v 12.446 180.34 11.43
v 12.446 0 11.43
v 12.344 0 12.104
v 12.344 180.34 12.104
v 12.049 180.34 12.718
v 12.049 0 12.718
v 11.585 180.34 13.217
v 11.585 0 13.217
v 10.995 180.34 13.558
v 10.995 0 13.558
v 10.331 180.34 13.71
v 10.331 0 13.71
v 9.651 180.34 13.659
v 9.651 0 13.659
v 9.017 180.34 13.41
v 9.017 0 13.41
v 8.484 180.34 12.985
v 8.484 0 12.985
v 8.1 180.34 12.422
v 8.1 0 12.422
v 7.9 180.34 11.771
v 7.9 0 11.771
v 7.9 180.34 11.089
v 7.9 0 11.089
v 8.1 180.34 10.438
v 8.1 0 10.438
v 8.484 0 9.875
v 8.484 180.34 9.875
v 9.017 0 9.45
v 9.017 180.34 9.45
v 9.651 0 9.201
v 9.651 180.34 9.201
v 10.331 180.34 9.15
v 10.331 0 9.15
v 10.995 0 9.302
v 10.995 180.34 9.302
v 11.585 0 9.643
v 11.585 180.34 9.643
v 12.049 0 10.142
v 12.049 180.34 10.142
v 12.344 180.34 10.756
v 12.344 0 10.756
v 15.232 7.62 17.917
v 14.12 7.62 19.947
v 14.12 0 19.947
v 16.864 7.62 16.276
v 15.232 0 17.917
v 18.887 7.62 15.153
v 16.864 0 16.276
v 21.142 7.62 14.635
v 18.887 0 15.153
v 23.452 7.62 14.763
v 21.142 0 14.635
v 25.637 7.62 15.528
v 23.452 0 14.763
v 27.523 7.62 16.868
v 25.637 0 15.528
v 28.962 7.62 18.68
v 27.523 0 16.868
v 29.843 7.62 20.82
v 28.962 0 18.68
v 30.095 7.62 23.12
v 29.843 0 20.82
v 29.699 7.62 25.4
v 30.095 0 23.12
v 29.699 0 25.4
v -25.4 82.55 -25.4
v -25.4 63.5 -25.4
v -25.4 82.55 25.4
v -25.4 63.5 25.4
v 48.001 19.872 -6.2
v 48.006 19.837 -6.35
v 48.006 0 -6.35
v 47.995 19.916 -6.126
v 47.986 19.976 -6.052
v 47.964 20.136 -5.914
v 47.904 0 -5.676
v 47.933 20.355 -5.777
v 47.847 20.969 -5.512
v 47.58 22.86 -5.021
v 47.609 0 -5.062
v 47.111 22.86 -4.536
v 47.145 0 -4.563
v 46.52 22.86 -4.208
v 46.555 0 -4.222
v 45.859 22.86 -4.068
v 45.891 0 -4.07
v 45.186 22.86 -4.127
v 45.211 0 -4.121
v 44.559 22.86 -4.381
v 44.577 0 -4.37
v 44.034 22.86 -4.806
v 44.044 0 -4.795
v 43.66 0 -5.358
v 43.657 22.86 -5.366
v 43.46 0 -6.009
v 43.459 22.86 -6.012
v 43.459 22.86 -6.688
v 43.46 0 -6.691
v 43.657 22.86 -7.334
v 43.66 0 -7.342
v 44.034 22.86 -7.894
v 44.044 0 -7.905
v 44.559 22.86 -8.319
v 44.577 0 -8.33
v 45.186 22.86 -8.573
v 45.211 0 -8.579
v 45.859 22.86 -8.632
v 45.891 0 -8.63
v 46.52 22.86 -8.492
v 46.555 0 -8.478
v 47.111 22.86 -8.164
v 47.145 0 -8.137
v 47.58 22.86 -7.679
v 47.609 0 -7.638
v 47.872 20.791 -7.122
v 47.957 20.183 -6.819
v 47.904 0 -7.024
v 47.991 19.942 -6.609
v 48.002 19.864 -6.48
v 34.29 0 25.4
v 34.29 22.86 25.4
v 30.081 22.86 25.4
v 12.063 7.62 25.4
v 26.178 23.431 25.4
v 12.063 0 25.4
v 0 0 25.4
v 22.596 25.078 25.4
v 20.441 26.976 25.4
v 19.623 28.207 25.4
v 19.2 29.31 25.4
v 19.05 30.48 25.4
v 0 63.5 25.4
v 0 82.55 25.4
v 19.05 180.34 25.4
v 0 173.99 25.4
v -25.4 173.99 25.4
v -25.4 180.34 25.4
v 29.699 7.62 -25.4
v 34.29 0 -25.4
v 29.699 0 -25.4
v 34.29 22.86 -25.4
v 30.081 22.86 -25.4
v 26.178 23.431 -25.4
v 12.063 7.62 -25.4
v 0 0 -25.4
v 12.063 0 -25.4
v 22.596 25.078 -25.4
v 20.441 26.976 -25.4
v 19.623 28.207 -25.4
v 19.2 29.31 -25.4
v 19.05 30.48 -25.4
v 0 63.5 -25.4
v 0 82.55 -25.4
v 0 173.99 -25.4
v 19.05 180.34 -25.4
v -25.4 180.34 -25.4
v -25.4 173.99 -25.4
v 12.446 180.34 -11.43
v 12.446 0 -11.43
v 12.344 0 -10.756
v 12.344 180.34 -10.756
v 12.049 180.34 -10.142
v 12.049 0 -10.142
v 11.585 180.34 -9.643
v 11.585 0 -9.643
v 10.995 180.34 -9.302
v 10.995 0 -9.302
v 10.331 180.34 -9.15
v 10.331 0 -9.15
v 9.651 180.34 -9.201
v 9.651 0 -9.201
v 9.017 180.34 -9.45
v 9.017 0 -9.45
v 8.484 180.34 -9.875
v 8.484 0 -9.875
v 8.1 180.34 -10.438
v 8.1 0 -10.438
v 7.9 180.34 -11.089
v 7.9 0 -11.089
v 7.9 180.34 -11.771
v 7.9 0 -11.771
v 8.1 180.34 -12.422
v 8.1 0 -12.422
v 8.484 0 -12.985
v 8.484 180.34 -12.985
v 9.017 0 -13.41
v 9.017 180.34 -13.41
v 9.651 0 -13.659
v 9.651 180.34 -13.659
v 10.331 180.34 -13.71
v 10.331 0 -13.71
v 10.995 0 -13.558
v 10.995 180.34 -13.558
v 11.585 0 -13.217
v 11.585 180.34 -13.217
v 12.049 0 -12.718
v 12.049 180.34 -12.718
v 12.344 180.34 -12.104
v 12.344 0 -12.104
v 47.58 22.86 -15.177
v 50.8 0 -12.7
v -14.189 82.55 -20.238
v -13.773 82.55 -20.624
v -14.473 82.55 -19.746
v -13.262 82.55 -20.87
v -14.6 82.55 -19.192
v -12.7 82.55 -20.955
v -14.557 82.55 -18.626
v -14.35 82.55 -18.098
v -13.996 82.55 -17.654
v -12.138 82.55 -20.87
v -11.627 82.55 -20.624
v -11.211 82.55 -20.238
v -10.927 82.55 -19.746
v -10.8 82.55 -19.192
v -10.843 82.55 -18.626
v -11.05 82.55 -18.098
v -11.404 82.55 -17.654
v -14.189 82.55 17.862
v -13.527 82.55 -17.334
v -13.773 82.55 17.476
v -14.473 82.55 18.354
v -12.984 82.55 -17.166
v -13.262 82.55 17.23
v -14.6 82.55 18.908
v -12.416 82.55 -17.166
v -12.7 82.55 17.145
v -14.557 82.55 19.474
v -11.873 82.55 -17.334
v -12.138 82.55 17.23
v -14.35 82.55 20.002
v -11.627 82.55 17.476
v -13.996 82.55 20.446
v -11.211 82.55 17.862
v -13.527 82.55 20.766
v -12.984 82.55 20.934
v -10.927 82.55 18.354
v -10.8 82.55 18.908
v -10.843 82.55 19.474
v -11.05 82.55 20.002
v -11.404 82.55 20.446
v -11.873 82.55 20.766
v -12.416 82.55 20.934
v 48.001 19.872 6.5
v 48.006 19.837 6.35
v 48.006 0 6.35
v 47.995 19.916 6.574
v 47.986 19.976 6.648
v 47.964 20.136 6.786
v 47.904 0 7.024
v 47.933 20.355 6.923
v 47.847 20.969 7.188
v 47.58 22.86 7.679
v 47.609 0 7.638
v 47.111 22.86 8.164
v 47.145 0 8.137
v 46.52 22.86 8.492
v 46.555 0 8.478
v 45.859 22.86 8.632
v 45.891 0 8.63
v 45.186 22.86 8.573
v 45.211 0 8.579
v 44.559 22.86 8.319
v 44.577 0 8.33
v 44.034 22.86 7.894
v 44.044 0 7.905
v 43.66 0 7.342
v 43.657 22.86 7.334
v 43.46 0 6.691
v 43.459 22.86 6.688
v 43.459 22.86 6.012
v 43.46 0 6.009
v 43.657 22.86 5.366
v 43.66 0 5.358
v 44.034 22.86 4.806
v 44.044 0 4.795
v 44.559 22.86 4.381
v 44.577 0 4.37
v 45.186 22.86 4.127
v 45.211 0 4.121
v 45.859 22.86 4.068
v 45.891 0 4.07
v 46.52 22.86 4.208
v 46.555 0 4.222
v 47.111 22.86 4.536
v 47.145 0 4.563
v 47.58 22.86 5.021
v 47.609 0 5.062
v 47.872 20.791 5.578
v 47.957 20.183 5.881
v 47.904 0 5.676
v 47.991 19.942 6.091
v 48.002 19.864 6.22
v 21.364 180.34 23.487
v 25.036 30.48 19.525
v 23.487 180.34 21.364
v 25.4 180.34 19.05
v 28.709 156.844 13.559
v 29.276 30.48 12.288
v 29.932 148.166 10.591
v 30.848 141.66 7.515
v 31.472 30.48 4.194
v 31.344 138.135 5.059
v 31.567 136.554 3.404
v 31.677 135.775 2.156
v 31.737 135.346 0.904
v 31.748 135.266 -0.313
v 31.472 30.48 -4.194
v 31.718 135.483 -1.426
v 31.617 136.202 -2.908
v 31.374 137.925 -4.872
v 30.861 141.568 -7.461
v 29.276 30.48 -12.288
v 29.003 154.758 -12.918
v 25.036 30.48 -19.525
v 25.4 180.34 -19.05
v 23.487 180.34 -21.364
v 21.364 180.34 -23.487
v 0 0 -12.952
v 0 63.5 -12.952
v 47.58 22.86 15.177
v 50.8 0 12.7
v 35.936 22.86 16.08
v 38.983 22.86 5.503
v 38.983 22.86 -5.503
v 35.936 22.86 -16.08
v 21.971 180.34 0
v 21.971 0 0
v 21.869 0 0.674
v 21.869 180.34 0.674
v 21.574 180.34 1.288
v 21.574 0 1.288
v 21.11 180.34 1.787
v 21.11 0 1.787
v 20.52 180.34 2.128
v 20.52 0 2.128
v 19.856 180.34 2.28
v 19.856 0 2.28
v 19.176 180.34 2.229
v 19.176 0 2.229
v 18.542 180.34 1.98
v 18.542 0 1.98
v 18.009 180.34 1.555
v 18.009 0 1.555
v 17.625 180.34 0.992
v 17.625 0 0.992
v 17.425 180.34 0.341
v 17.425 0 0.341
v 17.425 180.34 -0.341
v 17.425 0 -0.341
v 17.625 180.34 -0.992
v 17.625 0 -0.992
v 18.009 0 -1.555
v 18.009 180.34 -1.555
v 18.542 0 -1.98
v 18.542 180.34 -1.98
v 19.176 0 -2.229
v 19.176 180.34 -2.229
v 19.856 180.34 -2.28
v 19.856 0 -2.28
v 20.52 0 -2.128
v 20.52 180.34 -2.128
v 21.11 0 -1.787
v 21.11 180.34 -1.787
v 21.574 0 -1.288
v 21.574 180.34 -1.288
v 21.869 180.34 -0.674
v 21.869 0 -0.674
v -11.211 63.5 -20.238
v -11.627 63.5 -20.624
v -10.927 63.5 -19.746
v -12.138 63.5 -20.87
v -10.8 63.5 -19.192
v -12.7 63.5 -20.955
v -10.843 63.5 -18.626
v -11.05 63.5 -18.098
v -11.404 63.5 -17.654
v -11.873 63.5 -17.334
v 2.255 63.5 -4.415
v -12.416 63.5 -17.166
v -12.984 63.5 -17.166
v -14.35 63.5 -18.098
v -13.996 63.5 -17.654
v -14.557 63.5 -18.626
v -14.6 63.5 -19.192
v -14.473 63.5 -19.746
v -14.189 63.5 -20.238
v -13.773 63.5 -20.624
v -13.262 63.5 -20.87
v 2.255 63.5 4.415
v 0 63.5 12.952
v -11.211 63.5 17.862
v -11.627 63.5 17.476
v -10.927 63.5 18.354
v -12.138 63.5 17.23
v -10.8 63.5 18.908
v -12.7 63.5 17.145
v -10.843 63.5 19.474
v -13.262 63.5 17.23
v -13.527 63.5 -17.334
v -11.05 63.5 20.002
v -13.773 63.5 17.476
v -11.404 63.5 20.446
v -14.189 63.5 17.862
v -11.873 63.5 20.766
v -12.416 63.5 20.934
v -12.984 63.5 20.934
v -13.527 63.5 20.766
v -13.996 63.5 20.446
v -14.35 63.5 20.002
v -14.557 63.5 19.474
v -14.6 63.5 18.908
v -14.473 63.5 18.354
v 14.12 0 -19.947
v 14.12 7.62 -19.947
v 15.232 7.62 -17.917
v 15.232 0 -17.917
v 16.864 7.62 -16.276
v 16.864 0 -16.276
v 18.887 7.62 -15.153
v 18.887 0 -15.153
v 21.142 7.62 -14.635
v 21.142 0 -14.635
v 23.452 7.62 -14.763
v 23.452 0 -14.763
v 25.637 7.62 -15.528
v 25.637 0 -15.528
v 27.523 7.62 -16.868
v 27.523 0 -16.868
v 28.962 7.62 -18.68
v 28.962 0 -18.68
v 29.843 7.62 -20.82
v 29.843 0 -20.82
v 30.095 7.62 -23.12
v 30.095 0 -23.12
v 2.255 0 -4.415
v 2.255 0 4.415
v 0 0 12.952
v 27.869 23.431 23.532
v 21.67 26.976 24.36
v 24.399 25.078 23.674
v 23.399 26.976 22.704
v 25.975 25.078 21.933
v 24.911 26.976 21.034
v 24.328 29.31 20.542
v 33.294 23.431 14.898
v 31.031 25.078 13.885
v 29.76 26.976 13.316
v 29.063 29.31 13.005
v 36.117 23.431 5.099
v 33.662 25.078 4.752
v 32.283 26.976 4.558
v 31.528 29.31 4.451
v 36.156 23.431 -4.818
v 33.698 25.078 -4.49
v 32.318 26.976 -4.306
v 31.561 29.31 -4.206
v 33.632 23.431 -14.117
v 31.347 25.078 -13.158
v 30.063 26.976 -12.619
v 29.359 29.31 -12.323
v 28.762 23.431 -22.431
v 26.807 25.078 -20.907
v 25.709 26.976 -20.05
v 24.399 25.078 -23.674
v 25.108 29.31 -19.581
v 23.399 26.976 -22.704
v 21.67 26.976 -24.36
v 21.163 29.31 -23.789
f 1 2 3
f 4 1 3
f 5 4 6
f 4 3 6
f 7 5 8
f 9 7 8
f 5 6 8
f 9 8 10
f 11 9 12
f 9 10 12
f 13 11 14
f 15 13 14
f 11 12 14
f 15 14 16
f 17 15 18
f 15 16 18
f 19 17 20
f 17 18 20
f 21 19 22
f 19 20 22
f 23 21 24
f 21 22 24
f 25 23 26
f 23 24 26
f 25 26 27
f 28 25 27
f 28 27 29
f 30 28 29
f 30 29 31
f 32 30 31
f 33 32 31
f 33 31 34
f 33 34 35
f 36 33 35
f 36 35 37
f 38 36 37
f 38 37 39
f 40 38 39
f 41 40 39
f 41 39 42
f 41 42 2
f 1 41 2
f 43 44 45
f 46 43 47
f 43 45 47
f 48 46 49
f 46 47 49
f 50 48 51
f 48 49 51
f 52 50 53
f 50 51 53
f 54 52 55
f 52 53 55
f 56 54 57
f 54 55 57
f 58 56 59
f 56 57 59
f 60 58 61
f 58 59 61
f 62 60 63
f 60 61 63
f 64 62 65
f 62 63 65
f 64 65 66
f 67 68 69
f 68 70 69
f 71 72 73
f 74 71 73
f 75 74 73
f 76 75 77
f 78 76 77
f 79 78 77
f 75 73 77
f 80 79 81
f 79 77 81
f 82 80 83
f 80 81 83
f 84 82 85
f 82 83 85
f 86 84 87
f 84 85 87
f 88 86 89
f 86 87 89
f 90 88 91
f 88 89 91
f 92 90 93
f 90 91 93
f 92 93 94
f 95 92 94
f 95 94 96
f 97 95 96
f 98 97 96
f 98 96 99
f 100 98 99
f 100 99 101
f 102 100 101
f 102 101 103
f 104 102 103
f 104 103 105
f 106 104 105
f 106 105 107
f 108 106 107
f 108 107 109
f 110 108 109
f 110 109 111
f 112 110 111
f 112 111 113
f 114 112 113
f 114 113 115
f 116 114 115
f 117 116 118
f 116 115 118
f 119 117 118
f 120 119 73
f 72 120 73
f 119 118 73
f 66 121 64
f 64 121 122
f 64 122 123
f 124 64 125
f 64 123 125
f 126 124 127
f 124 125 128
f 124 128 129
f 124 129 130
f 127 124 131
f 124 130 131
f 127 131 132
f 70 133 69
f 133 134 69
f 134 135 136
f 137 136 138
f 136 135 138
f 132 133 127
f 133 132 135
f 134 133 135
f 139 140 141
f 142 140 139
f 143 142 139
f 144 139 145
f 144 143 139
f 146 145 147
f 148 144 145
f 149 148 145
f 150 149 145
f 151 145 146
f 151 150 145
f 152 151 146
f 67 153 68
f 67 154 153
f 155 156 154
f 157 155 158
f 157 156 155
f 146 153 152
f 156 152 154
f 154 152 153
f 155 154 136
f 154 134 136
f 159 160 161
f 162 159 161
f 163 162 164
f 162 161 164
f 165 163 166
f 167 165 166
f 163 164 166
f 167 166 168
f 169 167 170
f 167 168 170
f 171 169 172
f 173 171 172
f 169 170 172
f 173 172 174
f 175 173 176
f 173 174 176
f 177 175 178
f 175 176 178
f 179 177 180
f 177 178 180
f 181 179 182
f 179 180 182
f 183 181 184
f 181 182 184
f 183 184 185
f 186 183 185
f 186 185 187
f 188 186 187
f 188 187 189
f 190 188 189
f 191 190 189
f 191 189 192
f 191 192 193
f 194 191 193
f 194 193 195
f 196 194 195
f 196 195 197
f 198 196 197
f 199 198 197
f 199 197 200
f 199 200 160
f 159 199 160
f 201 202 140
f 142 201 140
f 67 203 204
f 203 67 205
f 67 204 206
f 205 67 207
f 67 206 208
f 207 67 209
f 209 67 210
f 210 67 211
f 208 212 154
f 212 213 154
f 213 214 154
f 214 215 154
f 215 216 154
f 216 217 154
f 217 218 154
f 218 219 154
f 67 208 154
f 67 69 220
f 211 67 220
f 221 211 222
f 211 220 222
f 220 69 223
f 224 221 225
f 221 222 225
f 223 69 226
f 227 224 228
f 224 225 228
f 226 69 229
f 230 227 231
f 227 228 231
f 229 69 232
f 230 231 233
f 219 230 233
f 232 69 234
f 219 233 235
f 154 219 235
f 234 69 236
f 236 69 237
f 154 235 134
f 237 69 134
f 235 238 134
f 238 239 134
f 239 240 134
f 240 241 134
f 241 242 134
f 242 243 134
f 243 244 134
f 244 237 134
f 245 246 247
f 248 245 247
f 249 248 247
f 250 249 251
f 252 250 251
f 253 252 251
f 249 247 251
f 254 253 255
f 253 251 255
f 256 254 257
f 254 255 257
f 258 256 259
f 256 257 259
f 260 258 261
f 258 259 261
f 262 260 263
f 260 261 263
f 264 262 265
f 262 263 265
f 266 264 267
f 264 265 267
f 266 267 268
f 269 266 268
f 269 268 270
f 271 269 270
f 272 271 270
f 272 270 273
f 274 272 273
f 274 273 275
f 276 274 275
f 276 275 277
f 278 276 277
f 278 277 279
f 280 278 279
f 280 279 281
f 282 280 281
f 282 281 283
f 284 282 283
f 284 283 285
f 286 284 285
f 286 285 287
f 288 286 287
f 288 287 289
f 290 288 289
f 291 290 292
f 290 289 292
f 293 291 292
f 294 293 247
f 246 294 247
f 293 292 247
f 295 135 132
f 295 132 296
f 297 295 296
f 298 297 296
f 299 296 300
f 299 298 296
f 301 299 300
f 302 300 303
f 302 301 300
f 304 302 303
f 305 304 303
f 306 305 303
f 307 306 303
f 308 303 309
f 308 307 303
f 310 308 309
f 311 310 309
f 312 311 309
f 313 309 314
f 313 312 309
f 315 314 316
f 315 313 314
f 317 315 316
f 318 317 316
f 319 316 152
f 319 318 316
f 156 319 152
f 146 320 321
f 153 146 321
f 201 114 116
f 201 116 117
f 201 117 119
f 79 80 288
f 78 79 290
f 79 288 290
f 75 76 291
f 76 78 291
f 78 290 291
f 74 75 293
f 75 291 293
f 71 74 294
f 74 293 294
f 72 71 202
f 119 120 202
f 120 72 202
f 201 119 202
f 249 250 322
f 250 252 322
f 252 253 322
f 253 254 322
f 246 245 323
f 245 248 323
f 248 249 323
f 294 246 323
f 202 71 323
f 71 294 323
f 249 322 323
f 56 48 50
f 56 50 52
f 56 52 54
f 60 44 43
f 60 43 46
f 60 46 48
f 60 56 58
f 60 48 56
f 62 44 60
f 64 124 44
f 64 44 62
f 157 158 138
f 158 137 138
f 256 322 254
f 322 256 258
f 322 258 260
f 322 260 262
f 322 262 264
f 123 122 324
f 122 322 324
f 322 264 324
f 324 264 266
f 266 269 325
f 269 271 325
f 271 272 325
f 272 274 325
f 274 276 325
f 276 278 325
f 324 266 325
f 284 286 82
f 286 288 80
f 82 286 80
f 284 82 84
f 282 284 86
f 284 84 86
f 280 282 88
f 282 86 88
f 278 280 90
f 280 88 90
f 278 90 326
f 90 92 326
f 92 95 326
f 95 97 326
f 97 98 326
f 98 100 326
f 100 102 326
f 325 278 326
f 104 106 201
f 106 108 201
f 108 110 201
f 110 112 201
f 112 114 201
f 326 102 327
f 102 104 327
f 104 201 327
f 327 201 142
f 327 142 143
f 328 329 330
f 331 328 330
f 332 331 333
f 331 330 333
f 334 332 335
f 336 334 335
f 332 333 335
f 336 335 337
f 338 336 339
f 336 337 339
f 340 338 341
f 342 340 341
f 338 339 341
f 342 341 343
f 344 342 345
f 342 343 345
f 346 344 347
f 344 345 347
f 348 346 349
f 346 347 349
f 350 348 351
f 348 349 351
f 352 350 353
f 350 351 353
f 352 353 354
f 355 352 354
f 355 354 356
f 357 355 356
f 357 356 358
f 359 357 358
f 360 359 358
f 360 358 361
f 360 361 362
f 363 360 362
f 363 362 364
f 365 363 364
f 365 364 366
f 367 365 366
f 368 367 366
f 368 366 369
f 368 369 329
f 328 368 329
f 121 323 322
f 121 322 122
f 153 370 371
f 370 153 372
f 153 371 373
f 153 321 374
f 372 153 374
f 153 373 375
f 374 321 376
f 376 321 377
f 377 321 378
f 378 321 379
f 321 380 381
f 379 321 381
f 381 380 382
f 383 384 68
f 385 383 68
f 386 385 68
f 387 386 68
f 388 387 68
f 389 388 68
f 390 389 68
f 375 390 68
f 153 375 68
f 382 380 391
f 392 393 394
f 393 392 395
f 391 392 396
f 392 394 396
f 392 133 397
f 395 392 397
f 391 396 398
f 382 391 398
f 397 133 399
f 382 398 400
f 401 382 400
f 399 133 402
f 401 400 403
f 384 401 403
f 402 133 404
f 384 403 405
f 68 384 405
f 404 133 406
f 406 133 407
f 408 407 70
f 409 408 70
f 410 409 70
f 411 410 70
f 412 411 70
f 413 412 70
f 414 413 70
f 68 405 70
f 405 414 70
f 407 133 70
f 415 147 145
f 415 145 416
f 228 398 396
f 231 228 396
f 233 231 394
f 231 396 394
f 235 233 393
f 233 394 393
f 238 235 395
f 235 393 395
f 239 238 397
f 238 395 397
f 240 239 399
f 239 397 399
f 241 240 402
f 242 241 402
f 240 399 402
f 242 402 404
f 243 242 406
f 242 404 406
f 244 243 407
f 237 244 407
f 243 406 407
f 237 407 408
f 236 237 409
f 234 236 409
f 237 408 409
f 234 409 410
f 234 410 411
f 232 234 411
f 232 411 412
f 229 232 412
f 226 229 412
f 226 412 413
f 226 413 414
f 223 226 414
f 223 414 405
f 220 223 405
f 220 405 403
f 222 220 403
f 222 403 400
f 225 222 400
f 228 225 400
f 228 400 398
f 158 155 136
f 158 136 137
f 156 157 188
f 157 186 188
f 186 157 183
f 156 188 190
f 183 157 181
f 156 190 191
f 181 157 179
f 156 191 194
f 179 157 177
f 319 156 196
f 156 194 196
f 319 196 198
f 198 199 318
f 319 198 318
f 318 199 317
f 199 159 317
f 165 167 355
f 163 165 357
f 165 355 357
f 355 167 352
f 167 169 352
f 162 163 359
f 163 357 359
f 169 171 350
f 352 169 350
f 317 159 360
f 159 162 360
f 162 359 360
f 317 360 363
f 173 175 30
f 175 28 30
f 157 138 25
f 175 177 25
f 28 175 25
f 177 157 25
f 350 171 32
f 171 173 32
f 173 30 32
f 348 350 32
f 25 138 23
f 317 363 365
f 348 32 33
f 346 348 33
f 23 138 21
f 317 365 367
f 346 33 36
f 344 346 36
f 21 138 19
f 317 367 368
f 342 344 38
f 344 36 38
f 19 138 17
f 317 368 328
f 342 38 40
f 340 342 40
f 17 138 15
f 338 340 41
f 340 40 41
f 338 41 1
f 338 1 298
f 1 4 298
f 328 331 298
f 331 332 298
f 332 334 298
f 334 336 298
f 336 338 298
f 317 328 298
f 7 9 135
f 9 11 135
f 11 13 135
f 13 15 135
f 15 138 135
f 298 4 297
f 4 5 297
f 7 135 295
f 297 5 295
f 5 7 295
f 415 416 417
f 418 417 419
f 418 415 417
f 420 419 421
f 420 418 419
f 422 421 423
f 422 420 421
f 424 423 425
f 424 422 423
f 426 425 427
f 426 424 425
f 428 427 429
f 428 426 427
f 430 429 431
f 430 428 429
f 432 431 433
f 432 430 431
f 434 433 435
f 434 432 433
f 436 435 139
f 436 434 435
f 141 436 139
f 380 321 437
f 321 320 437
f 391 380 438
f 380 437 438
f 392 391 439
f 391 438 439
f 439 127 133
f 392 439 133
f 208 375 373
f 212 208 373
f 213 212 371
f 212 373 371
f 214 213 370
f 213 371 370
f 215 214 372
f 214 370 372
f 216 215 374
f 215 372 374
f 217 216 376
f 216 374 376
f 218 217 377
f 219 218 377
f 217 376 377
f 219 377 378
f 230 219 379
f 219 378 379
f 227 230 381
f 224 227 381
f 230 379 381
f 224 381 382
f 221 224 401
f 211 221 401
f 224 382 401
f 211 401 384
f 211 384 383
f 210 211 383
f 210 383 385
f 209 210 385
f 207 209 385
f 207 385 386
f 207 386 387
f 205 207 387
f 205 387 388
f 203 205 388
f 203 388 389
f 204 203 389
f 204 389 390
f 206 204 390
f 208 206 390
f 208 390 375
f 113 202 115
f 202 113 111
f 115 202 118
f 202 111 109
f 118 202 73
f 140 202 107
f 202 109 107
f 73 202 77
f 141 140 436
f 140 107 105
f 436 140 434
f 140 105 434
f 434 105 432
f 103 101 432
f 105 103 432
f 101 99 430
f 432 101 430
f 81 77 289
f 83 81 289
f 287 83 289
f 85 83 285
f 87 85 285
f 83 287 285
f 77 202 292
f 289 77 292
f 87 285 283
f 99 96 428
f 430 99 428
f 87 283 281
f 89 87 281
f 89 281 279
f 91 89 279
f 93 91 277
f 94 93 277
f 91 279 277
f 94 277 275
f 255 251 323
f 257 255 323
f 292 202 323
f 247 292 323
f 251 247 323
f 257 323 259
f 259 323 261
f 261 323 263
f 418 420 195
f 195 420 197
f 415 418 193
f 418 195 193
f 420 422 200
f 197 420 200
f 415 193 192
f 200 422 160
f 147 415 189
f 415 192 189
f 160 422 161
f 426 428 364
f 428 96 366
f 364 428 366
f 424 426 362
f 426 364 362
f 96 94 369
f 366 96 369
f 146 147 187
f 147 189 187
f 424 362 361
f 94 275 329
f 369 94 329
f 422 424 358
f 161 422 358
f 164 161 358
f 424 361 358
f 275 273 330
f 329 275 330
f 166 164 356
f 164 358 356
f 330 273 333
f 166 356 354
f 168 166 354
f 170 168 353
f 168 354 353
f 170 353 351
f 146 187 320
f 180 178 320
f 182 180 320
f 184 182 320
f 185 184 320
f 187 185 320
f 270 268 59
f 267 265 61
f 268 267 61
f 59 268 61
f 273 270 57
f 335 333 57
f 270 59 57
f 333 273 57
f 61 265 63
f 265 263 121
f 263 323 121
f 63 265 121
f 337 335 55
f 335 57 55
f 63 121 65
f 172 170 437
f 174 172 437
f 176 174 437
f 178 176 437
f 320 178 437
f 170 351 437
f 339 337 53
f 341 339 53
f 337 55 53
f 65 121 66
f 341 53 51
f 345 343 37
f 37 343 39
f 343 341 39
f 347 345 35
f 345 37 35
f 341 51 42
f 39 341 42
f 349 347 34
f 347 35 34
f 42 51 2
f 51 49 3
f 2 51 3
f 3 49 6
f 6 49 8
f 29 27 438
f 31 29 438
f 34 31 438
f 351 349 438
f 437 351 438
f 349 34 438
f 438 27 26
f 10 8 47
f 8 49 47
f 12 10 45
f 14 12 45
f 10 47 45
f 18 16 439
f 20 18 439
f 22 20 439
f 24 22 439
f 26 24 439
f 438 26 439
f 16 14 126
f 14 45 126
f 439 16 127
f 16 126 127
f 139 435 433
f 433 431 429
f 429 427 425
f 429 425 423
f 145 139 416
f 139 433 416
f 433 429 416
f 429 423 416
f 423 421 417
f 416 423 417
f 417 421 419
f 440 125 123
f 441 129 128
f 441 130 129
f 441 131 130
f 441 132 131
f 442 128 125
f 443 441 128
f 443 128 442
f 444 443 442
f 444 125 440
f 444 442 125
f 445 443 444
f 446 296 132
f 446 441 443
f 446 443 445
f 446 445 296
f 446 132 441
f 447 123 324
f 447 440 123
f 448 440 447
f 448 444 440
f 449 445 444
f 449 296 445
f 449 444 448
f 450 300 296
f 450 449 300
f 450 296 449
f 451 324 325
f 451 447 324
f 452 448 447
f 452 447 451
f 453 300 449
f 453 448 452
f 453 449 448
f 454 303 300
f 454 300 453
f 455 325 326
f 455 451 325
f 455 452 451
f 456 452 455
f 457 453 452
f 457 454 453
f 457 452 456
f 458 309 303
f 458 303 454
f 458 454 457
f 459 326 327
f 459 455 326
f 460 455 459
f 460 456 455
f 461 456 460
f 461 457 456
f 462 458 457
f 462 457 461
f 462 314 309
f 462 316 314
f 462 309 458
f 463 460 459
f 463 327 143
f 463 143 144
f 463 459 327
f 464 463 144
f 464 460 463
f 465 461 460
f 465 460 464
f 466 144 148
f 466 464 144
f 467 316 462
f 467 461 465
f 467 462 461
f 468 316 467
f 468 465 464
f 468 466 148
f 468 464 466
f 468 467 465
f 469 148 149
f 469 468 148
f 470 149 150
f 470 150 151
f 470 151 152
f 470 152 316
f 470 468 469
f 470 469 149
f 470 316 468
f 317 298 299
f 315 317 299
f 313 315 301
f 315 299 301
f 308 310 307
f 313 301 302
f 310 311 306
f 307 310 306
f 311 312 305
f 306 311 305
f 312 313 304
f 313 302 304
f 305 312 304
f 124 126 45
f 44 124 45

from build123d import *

# Parameters (mm, degrees)
BOSS_EXTRUDE1_DEPTH = 25.4
SKETCH2_R           = 2.286
CUT_EXTRUDE1_DEPTH  = 190.072249682
SKETCH3_R           = 1.905
CUT_EXTRUDE2_DEPTH  = 20.32
SKETCH4_R           = 34.29
CUT_EXTRUDE3_DEPTH  = 63.5
CUT_EXTRUDE4_DEPTH  = 7.62
CUT_EXTRUDE5_DEPTH  = 190.072249682
CUT_EXTRUDE6_DEPTH  = 157.48
FILLET1_R           = 7.62


with BuildPart() as part:
    # Sketch1 → Boss-Extrude1 (new, symmetric)
    with BuildSketch(Plane.XY):
        Polygon((0, 0), (0, 63.5), (-25.4, 63.5), (-25.4, 82.55), (0, 82.55), (0, 173.99), (-25.4, 173.99), (-25.4, 180.34), (25.4, 180.34), (50.8, 0), align=None)
    extrude(amount=BOSS_EXTRUDE1_DEPTH, both=True)

    # Sketch2 → Cut-Extrude1 (cut, through all)
    with BuildSketch(Plane.XZ):
        with Locations((10.16, -11.43)):
            Circle(SKETCH2_R)
        with Locations((19.685, 0)):
            Circle(SKETCH2_R)
        with Locations((10.16, 11.43)):
            Circle(SKETCH2_R)
        with Locations((45.72, -6.35)):
            Circle(SKETCH2_R)
        with Locations((45.72, 6.35)):
            Circle(SKETCH2_R)
    extrude(amount=-CUT_EXTRUDE1_DEPTH, mode=Mode.SUBTRACT)

    # Sketch3 → Cut-Extrude2 (cut)
    with BuildSketch(Plane.XZ.offset(-63.5)):
        with Locations(Location((-12.7, -19.05, 0), (0, 0, 270))):
            Circle(SKETCH3_R)
        with Locations(Location((-12.7, 19.05, 0), (0, 0, 270))):
            Circle(SKETCH3_R)
    extrude(amount=-CUT_EXTRUDE2_DEPTH, mode=Mode.SUBTRACT)

    # Sketch4 → Cut-Extrude3 (cut)
    with BuildSketch(Plane.XZ):
        with Locations((-31.75, 0)):
            Circle(SKETCH4_R)
    extrude(amount=-CUT_EXTRUDE3_DEPTH, mode=Mode.SUBTRACT)

    # Sketch5 → Cut-Extrude4 (cut)
    with BuildSketch(Plane.XZ):
        with BuildLine():
            Line((29.567845881, -25.773285055), (18.829761526, -54.242627064))
            ThreePointArc((18.829761526, -54.242627064), (8.19263059, -59.053187889), (3.382069764, -48.416056953))
            Line((3.382069764, -48.416056953), (14.120154119, -19.946714945))
            ThreePointArc((14.120154119, -19.946714945), (24.757285055, -15.136154119), (29.567845881, -25.773285055))
        make_face()
        with BuildLine():
            Line((29.567845881, 25.773285055), (18.829761526, 54.242627064))
            ThreePointArc((18.829761526, 54.242627064), (8.19263059, 59.053187889), (3.382069764, 48.416056953))
            Line((3.382069764, 48.416056953), (14.120154119, 19.946714945))
            ThreePointArc((14.120154119, 19.946714945), (24.757285055, 15.136154119), (29.567845881, 25.773285055))
        make_face()
    extrude(amount=-CUT_EXTRUDE4_DEPTH, mode=Mode.SUBTRACT)

    # Sketch6 → Cut-Extrude5 (cut, through all)
    with BuildSketch(Plane.XZ):
        Polygon((50.8, 25.4), (50.8, 12.7), (34.29, 25.4), align=None)
        Polygon((34.29, -25.4), (50.8, -25.4), (50.8, -12.7), align=None)
    extrude(amount=-CUT_EXTRUDE5_DEPTH, mode=Mode.SUBTRACT)

    # Sketch7 → Cut-Extrude6 (cut)
    with BuildSketch(Plane(origin=(0, 180.34, 0), x_dir=(1, 0, 0), z_dir=(0, 1, 0))):
        with BuildLine():
            Line((0, 31.75), (50.8, 31.75))
            Line((50.8, 31.75), (50.8, -31.75))
            Line((50.8, -31.75), (0, -31.75))
            ThreePointArc((0, -31.75), (31.75, 0), (0, 31.75))
        make_face()
    extrude(amount=-CUT_EXTRUDE6_DEPTH, mode=Mode.SUBTRACT)

    # Fillet1
    fillet1_edges = [part.edges().sort_by_distance(p)[0] for p in [
        (31.75, 22.86, 0),
    ]]
    fillet(fillet1_edges, radius=FILLET1_R)


solid = part.part
